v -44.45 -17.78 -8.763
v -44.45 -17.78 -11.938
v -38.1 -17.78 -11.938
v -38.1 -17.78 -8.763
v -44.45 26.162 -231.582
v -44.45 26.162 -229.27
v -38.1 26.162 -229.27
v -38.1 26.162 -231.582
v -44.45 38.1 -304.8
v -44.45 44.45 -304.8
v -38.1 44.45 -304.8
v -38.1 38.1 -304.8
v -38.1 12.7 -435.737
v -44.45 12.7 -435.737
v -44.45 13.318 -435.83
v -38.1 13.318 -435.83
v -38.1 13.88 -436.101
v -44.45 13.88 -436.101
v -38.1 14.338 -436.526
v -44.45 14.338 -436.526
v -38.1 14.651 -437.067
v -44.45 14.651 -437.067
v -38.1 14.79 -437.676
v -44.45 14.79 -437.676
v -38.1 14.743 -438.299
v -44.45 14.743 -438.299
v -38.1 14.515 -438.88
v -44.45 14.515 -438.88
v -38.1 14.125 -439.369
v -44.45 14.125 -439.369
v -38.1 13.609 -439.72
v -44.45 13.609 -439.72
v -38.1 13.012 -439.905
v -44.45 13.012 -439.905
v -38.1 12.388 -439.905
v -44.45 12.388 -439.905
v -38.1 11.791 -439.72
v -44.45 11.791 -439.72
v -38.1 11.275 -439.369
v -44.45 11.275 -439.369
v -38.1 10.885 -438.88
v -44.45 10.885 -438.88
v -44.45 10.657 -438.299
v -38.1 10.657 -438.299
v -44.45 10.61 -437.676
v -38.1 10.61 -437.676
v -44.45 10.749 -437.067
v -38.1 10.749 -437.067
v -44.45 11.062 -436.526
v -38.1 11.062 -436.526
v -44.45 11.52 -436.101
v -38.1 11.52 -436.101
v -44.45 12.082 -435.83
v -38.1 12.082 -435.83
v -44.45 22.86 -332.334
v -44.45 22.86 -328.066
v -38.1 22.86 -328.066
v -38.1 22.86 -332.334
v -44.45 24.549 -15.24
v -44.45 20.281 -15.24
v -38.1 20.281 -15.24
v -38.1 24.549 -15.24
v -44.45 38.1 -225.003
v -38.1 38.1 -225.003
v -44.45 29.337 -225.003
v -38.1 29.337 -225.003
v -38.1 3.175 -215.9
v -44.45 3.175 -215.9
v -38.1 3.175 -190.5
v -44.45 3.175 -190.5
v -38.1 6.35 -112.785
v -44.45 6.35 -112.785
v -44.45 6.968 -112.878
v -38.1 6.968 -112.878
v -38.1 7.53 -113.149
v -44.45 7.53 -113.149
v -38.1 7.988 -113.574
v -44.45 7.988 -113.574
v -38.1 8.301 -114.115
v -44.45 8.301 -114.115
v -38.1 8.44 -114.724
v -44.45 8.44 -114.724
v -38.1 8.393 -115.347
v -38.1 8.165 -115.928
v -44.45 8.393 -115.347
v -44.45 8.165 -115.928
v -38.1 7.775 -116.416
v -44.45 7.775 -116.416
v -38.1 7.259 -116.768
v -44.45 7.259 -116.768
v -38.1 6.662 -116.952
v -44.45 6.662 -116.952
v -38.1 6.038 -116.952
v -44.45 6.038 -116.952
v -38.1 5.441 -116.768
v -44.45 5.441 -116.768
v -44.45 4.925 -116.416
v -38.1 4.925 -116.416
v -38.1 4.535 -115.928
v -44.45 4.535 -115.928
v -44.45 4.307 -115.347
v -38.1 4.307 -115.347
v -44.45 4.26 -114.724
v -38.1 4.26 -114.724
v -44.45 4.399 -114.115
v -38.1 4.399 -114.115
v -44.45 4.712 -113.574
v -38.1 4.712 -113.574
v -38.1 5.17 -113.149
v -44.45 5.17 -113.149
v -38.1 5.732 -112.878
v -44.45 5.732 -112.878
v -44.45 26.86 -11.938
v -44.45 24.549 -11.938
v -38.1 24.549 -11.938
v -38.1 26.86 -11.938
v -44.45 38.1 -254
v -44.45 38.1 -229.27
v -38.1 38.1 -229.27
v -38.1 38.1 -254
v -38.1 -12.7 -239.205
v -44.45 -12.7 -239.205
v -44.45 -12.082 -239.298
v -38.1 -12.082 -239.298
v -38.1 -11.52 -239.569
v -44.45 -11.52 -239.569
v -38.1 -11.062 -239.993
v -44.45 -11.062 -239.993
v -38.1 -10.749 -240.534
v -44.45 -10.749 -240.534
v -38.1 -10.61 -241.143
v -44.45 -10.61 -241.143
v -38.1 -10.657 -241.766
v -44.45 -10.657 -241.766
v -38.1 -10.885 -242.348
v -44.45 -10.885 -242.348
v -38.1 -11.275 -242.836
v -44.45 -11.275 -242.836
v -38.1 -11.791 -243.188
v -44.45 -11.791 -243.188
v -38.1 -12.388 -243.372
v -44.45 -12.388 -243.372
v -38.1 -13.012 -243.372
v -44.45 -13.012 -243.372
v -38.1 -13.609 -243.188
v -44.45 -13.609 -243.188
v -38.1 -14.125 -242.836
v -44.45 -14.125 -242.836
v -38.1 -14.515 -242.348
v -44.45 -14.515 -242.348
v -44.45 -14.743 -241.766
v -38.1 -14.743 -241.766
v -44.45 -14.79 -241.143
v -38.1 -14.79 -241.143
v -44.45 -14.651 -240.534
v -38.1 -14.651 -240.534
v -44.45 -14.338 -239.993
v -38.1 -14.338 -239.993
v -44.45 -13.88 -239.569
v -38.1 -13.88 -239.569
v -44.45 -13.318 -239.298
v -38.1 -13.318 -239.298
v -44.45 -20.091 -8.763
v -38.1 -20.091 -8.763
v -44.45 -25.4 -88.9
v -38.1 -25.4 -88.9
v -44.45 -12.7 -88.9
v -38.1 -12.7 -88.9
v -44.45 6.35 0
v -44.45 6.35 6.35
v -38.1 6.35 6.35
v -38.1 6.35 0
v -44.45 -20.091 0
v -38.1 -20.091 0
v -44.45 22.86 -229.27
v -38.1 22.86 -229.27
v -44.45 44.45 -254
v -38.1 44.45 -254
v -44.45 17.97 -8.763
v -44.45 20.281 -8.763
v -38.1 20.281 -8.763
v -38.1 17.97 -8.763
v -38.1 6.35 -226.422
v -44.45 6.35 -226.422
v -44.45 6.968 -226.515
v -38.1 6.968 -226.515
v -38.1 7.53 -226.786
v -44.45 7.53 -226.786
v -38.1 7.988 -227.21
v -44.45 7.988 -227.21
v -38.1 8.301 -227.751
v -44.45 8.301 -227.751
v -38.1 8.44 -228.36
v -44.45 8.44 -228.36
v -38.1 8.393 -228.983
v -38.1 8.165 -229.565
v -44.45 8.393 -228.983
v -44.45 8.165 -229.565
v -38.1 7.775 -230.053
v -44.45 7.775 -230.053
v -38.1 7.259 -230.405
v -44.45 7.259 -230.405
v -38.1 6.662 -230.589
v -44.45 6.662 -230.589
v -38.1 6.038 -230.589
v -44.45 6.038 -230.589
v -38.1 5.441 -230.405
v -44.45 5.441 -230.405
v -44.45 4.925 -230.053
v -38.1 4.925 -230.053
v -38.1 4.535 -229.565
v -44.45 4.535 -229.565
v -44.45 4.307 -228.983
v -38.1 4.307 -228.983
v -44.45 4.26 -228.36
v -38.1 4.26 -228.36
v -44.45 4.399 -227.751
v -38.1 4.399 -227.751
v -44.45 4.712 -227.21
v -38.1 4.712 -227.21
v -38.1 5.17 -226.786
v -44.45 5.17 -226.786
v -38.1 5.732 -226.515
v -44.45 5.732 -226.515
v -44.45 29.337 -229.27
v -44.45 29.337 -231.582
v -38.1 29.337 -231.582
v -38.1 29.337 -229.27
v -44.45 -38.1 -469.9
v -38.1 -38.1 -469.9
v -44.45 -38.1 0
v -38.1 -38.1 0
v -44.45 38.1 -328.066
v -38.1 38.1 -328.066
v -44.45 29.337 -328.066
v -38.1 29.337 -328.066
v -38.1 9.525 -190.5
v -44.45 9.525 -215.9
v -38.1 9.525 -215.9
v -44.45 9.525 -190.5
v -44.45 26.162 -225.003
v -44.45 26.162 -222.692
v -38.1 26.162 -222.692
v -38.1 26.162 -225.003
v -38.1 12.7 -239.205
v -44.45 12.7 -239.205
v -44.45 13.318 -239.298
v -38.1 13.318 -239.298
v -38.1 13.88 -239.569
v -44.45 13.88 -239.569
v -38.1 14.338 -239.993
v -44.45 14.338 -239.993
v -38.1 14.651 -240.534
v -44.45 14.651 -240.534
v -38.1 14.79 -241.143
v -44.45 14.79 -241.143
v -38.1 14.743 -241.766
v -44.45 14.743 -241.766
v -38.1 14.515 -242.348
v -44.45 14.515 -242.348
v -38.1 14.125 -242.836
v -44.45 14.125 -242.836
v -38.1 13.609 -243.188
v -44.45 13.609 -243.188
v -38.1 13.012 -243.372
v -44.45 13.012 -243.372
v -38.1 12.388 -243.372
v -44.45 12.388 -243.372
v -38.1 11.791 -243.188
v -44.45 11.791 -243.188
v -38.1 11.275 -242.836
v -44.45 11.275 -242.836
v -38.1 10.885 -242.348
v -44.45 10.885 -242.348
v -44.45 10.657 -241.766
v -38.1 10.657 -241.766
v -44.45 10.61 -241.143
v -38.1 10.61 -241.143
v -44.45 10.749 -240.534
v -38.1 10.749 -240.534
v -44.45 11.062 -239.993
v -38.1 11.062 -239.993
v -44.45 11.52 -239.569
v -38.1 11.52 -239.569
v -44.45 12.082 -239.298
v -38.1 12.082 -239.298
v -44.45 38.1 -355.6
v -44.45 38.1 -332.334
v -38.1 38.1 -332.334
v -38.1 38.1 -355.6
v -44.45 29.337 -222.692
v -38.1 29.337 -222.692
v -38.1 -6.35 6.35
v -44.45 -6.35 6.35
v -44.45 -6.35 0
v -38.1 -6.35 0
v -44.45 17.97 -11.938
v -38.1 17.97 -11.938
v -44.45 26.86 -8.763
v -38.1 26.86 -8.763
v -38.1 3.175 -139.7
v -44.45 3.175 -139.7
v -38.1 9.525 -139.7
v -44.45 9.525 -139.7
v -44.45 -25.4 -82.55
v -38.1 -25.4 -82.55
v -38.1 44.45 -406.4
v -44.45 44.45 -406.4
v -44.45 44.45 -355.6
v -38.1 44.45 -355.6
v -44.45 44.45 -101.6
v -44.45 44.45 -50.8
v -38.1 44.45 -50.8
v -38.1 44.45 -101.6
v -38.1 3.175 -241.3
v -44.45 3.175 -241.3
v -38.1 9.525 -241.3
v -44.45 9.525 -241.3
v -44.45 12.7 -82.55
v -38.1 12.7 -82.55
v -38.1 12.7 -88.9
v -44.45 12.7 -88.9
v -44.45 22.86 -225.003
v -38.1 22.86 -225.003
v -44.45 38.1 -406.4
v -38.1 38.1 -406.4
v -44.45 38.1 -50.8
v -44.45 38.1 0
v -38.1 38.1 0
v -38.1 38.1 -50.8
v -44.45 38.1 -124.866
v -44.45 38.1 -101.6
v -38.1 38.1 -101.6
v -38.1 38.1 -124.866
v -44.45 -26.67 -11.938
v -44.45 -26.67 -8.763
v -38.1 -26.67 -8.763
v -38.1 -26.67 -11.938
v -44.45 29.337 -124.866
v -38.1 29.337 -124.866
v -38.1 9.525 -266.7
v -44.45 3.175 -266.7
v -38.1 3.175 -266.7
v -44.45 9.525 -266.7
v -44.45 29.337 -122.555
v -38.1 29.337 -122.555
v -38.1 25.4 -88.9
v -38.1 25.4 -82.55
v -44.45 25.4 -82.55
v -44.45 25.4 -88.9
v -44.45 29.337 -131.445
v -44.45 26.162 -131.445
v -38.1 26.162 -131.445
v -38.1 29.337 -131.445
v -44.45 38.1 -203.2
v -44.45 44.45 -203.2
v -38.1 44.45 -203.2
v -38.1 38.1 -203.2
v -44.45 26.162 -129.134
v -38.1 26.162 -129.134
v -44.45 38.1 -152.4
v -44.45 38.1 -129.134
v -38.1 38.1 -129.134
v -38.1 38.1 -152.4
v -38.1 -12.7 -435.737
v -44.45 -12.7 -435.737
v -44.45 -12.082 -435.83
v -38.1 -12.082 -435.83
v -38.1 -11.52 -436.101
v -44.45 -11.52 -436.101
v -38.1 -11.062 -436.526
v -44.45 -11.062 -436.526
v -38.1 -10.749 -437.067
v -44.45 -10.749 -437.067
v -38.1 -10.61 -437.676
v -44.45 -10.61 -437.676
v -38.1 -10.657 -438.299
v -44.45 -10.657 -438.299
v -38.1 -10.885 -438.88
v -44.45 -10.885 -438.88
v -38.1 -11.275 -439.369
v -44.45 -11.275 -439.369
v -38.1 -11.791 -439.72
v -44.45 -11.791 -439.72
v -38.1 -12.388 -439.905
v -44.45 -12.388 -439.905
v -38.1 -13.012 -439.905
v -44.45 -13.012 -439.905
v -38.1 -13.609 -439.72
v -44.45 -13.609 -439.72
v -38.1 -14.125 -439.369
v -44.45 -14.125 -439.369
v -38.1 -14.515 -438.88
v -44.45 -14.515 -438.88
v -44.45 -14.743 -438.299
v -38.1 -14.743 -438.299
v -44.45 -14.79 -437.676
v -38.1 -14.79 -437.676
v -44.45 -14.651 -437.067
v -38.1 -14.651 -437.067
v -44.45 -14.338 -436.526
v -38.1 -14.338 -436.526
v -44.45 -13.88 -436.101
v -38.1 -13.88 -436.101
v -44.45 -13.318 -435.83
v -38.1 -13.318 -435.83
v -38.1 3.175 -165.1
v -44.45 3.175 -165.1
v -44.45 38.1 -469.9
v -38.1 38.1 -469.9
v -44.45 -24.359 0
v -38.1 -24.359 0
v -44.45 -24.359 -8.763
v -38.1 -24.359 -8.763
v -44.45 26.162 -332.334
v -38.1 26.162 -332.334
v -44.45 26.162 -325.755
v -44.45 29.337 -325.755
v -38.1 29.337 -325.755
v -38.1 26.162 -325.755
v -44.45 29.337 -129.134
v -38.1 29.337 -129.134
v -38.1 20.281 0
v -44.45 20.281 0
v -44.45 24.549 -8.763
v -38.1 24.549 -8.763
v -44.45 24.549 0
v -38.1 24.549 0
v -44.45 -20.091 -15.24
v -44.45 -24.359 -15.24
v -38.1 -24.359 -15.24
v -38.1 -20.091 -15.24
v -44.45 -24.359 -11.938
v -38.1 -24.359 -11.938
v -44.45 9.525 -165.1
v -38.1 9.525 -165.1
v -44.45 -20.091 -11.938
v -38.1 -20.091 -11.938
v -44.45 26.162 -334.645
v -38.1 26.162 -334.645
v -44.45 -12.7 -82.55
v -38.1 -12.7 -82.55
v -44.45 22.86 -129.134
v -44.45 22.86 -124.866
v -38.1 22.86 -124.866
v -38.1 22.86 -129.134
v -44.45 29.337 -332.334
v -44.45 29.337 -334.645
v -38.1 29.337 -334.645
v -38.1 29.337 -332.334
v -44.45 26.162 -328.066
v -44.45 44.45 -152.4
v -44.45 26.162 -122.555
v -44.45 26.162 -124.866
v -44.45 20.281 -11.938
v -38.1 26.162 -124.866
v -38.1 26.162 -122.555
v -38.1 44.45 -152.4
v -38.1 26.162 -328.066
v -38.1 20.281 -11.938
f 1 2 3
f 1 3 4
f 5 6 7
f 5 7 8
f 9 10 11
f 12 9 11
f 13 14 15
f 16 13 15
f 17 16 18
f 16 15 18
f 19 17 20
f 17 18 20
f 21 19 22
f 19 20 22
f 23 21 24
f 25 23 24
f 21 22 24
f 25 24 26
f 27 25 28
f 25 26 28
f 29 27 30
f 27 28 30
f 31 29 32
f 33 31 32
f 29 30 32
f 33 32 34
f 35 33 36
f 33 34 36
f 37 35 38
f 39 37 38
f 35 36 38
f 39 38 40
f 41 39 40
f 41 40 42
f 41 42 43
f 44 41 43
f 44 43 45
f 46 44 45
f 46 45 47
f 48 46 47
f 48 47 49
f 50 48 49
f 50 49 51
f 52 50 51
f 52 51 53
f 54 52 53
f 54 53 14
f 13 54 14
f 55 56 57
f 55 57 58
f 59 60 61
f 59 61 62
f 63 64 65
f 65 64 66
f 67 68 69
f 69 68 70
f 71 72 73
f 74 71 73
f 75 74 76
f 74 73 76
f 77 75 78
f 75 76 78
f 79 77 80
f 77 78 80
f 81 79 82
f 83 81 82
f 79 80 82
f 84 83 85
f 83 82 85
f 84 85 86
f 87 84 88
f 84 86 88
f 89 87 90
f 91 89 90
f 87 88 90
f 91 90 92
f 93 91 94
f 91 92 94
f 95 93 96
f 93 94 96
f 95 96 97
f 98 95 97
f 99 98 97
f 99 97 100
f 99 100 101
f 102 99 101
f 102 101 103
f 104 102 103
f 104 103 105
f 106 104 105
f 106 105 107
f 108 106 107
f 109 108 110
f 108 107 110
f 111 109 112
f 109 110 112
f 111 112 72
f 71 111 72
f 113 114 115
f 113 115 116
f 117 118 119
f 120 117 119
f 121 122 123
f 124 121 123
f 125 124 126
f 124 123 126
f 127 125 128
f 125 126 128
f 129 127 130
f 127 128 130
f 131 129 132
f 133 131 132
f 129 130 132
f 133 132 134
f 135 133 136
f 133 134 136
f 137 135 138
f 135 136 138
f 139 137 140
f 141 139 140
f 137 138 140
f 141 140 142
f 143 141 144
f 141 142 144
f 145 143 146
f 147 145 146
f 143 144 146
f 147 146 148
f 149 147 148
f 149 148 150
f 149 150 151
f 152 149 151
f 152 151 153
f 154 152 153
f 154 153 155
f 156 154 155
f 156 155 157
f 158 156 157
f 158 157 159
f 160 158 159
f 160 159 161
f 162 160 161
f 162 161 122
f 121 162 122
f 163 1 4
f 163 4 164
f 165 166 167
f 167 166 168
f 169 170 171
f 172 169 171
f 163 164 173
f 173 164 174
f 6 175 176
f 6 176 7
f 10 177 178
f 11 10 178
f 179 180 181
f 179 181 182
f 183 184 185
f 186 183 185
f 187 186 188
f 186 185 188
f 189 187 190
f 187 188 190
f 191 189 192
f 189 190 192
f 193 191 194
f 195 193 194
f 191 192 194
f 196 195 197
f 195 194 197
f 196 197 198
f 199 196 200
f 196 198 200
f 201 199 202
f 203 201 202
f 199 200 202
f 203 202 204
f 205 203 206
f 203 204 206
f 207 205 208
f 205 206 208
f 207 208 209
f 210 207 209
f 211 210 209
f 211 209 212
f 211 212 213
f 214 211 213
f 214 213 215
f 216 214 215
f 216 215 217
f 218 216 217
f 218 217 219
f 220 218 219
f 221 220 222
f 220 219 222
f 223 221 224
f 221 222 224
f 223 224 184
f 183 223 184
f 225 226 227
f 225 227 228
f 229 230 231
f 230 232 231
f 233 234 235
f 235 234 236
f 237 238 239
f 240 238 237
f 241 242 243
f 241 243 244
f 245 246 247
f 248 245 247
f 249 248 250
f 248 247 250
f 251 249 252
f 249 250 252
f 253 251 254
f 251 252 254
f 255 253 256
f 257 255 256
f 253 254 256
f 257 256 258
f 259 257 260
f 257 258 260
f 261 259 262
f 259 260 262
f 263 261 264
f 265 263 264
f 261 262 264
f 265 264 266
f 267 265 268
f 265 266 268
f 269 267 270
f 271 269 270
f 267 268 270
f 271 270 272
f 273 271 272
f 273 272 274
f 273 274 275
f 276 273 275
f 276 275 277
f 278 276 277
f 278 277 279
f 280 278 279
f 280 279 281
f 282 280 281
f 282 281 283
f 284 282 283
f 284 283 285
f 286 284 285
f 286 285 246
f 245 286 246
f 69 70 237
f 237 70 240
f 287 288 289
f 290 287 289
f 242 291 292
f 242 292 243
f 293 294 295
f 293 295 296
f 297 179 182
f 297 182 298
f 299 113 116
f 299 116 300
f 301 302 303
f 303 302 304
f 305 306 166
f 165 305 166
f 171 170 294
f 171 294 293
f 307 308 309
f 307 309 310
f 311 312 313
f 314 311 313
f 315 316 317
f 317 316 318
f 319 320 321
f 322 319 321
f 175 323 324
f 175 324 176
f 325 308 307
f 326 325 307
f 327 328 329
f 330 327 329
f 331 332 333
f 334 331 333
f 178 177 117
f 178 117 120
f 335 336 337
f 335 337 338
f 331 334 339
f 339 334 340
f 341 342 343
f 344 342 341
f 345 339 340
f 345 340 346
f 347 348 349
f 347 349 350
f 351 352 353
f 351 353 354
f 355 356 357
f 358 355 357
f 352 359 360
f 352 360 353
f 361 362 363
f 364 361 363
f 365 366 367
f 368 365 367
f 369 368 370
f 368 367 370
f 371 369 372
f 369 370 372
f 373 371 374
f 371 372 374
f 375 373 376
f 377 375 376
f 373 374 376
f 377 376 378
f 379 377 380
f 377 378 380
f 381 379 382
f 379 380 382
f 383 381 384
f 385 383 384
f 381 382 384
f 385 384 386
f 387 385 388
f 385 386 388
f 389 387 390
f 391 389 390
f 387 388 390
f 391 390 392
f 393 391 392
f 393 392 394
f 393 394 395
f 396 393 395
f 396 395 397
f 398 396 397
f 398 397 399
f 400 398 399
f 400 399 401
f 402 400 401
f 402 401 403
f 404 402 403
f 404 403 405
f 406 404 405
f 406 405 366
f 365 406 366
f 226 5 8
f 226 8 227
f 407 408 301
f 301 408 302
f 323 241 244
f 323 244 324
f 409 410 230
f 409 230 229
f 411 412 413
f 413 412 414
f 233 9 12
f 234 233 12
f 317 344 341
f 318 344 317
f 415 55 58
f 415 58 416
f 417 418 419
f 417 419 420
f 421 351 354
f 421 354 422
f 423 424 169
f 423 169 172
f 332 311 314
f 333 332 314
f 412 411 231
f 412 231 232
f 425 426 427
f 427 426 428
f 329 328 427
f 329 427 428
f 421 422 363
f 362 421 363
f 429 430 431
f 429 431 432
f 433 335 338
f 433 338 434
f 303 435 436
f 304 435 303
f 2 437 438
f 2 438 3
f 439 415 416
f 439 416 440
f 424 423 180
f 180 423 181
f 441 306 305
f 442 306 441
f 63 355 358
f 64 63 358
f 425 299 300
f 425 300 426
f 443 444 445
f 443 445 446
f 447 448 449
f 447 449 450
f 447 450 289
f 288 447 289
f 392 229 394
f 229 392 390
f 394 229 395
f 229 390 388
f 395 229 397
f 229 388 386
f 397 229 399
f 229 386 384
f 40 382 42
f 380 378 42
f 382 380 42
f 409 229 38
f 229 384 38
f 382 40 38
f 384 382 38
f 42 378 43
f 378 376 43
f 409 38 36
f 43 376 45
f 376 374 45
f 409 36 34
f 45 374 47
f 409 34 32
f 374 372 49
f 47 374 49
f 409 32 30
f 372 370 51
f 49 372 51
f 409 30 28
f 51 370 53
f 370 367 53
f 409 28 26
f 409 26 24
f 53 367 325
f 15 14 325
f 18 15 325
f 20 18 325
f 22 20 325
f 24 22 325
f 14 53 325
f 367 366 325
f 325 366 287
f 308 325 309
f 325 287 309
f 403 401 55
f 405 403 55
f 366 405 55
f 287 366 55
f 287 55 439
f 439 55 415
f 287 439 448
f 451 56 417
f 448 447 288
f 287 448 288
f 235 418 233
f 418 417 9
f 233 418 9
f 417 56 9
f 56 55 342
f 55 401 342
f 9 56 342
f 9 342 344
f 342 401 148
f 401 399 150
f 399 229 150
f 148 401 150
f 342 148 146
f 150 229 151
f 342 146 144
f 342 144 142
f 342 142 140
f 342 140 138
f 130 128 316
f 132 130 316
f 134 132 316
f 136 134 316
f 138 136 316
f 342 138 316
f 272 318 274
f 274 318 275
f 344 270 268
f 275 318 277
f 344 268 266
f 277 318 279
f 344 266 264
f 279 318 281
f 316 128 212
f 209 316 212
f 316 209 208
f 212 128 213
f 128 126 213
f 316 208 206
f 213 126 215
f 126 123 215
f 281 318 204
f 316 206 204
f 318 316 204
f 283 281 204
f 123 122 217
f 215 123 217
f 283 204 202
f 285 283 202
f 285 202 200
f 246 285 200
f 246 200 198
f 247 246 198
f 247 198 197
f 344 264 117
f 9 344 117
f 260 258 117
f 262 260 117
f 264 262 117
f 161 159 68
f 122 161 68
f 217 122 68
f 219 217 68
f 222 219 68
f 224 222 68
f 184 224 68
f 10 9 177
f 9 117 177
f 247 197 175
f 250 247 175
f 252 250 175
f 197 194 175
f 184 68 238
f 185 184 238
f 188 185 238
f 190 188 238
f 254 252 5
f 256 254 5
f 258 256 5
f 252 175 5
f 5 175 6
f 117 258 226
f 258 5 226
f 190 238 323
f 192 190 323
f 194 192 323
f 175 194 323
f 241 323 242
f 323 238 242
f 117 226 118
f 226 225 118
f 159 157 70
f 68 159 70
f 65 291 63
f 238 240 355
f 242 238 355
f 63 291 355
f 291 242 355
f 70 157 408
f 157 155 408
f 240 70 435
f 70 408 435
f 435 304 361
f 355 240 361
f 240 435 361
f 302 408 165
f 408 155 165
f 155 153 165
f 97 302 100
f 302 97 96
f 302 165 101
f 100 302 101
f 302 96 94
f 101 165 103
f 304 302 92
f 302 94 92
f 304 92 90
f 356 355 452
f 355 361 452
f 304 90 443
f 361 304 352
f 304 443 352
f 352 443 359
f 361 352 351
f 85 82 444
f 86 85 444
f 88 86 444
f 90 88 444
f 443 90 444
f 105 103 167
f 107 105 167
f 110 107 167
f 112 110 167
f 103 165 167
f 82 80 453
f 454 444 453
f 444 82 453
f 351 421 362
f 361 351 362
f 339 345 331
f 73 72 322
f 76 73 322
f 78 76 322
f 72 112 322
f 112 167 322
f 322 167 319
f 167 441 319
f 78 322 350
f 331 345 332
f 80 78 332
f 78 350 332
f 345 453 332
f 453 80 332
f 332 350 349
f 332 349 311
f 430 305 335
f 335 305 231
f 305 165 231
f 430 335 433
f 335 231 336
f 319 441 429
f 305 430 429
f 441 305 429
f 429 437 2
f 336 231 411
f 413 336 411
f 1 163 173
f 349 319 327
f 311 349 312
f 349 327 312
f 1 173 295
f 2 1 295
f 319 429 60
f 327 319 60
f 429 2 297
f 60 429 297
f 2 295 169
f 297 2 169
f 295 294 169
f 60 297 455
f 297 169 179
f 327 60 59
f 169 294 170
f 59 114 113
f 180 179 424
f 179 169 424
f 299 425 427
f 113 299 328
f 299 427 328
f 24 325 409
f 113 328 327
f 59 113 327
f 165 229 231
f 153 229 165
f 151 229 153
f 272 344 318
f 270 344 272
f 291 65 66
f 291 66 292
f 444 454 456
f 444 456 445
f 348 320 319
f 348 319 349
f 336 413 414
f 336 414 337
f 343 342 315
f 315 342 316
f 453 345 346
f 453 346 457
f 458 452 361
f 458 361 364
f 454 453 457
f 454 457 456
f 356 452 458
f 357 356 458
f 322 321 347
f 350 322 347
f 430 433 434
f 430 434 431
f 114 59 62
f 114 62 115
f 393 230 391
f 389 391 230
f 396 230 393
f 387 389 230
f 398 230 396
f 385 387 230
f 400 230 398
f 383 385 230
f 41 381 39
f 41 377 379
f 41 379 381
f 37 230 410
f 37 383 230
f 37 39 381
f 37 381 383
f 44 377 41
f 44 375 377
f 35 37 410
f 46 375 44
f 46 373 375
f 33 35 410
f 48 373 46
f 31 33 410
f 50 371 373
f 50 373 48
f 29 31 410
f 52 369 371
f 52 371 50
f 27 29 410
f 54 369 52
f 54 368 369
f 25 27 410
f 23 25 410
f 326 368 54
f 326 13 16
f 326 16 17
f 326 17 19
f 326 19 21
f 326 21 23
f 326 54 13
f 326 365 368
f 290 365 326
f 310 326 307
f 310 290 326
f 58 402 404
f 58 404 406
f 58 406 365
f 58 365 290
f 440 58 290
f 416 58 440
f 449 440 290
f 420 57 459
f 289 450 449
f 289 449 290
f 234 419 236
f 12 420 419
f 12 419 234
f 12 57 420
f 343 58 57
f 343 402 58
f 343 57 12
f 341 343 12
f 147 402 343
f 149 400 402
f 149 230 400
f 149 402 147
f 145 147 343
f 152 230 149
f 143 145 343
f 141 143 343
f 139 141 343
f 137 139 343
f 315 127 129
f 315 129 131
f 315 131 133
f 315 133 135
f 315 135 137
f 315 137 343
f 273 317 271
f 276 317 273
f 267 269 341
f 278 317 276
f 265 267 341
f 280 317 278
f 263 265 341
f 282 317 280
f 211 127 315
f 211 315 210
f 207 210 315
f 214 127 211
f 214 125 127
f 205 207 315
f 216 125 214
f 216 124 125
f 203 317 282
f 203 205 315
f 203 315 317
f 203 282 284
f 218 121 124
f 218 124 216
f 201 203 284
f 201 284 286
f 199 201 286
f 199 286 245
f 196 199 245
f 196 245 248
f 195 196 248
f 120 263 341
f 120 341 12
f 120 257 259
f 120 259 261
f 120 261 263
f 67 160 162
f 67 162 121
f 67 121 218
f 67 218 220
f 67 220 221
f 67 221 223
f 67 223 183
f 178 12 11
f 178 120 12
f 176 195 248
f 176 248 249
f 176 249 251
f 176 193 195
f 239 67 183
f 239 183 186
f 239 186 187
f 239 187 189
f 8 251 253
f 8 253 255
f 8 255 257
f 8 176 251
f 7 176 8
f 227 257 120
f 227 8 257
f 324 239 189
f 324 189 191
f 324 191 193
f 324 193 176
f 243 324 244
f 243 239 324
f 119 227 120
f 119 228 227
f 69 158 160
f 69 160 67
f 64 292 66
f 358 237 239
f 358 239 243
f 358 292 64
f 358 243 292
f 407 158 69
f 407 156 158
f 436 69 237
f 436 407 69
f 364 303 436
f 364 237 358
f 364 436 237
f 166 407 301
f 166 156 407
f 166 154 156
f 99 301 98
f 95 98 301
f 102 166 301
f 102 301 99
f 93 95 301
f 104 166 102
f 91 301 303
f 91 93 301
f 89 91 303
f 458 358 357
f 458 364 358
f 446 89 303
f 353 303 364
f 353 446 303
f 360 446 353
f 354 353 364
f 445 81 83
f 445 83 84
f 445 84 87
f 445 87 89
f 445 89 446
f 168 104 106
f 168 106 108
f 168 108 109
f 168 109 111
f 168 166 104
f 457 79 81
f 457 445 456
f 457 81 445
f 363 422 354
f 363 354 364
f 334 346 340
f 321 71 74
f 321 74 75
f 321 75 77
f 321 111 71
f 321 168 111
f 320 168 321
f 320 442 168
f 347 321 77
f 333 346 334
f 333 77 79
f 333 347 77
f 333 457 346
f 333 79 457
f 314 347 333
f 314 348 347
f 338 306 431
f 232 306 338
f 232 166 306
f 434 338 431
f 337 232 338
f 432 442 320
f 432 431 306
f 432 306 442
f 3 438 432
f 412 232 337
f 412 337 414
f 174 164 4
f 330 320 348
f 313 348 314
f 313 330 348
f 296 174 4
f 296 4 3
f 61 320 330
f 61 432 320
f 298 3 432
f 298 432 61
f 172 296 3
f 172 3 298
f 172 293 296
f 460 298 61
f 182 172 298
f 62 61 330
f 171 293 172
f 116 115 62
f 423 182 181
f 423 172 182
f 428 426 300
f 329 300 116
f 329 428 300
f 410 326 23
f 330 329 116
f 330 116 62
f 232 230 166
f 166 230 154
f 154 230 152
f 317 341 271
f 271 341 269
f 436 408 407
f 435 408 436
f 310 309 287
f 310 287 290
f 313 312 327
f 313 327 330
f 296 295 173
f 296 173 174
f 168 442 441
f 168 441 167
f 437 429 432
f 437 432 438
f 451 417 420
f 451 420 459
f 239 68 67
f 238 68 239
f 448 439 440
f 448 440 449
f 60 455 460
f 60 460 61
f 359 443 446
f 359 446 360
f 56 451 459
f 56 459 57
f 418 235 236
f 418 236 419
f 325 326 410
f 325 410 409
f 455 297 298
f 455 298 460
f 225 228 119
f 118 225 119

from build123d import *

# Parameters (mm, degrees)
SKETCH1_W           = 6.35
SKETCH1_H           = 76.2
BOSS_EXTRUDE1_DEPTH = 457.2
SKETCH2_W           = 6.35
SKETCH2_H           = 50.8
BOSS_EXTRUDE2_DEPTH = 6.35
SKETCH3_W           = 6.35
SKETCH3_H           = 12.7
CUT_EXTRUDE1_DEPTH  = 460.399570091
SKETCH4_W           = 6.35
SKETCH4_H           = 12.7
BOSS_EXTRUDE4_DEPTH = 6.35
SKETCH7_R           = 2.0955
CUT_EXTRUDE2_DEPTH  = 460.399570091
SKETCH9_R           = 2.0955
SKETCH9_W           = 25.4
SKETCH9_H           = 6.35
CUT_EXTRUDE3_DEPTH  = 6.35
CUT_EXTRUDE4_DEPTH  = 6.35
SKETCH11_W          = 6.35
SKETCH11_H          = 76.2
BOSS_EXTRUDE5_DEPTH = 12.7


with BuildPart() as part:
    # Sketch1 → Boss-Extrude1 (new body)
    with BuildSketch(Plane.XY):
        with Locations((-41.275, 0)):
            Rectangle(SKETCH1_W, SKETCH1_H)
    extrude(amount=-BOSS_EXTRUDE1_DEPTH)

    # Sketch2 → Boss-Extrude2 (add)
    with BuildSketch(Plane(origin=(0, 38.1, 0), x_dir=(1, 0, 0), z_dir=(0, 1, 0))):
        with Locations((-41.275, 381)):
            Rectangle(SKETCH2_W, SKETCH2_H)
        with Locations((-41.275, 279.4)):
            Rectangle(SKETCH2_W, SKETCH2_H)
        with Locations((-41.275, 177.8)):
            Rectangle(SKETCH2_W, SKETCH2_H)
        with Locations((-41.275, 76.2)):
            Rectangle(SKETCH2_W, SKETCH2_H)
    extrude(amount=BOSS_EXTRUDE2_DEPTH)

    # Sketch3 → Cut-Extrude1 (cut, through all)
    with BuildSketch(Plane(origin=(-38.1, 0, 0), x_dir=(0, 0, -1), z_dir=(1, 0, 0))):
        with Locations((85.725, 19.05)):
            Rectangle(SKETCH3_W, SKETCH3_H)
        with Locations((85.725, -19.05)):
            Rectangle(SKETCH3_W, SKETCH3_H)
    extrude(amount=-CUT_EXTRUDE1_DEPTH, mode=Mode.SUBTRACT)

    # Sketch4 → Boss-Extrude4 (add)
    with BuildSketch(Plane.XY):
        with Locations((-41.275, 0)):
            Rectangle(SKETCH4_W, SKETCH4_H)
    extrude(amount=BOSS_EXTRUDE4_DEPTH)

    # Sketch7 → Cut-Extrude2 (cut, through all)
    with BuildSketch(Plane.ZY.offset(44.45)):
        with Locations((-241.3, -12.7)):
            Circle(SKETCH7_R)
        with Locations((-241.3, 12.7)):
            Circle(SKETCH7_R)
        with Locations((-437.8325, -12.7)):
            Circle(SKETCH7_R)
        with Locations((-437.8325, 12.7)):
            Circle(SKETCH7_R)
    extrude(amount=-CUT_EXTRUDE2_DEPTH, mode=Mode.SUBTRACT)

    # Sketch9 → Cut-Extrude3 (cut)
    with BuildSketch(Plane.ZY.offset(44.45)):
        with Locations((-114.880216651, 6.35)):
            Circle(SKETCH9_R)
        with Locations((-228.517018256, 6.35)):
            Circle(SKETCH9_R)
        with Locations((-254, 6.35)):
            Rectangle(SKETCH9_W, SKETCH9_H)
        with Locations((-203.2, 6.35)):
            Rectangle(SKETCH9_W, SKETCH9_H)
        with Locations((-152.4, 6.35)):
            Rectangle(SKETCH9_W, SKETCH9_H)
    extrude(amount=-CUT_EXTRUDE3_DEPTH, mode=Mode.SUBTRACT)

    # Sketch10 → Cut-Extrude4 (cut)
    with BuildSketch(Plane(origin=(-38.1, 0, 0), x_dir=(0, 0, -1), z_dir=(1, 0, 0))):
        Polygon((0, 24.548534751), (0, 20.281334751), (8.763, 20.281334751), (8.763, 17.969934751), (11.938, 17.969934751), (11.938, 20.281334751), (15.24, 20.281334751), (15.24, 24.548534751), (11.938, 24.548534751), (11.938, 26.859934751), (8.763, 26.859934751), (8.763, 24.548534751), align=None)
        Polygon((0, -20.0914), (0, -24.3586), (8.763, -24.3586), (8.763, -26.67), (11.938, -26.67), (11.938, -24.3586), (15.24, -24.3586), (15.24, -20.0914), (11.938, -20.0914), (11.938, -17.78), (8.763, -17.78), (8.763, -20.0914), align=None)
        Polygon((332.3336, 38.1), (328.0664, 38.1), (328.0664, 29.337), (325.755, 29.337), (325.755, 26.162), (328.0664, 26.162), (328.0664, 22.86), (332.3336, 22.86), (332.3336, 26.162), (334.645, 26.162), (334.645, 29.337), (332.3336, 29.337), align=None)
        Polygon((229.270305867, 38.1), (225.003105867, 38.1), (225.003105867, 29.337), (222.691705867, 29.337), (222.691705867, 26.162), (225.003105867, 26.162), (225.003105867, 22.86), (229.270305867, 22.86), (229.270305867, 26.162), (231.581705867, 26.162), (231.581705867, 29.337), (229.270305867, 29.337), align=None)
        Polygon((129.1336, 38.1), (124.8664, 38.1), (124.8664, 29.337), (122.555, 29.337), (122.555, 26.162), (124.8664, 26.162), (124.8664, 22.86), (129.1336, 22.86), (129.1336, 26.162), (131.445, 26.162), (131.445, 29.337), (129.1336, 29.337), align=None)
    extrude(amount=-CUT_EXTRUDE4_DEPTH, mode=Mode.SUBTRACT)

    # Sketch11 → Boss-Extrude5 (add)
    with BuildSketch(Plane(origin=(0, 0, -457.2), x_dir=(-1, 0, 0), z_dir=(0, 0, -1))):
        with Locations((41.275, 0)):
            Rectangle(SKETCH11_W, SKETCH11_H)
    extrude(amount=BOSS_EXTRUDE5_DEPTH)


solid = part.part
